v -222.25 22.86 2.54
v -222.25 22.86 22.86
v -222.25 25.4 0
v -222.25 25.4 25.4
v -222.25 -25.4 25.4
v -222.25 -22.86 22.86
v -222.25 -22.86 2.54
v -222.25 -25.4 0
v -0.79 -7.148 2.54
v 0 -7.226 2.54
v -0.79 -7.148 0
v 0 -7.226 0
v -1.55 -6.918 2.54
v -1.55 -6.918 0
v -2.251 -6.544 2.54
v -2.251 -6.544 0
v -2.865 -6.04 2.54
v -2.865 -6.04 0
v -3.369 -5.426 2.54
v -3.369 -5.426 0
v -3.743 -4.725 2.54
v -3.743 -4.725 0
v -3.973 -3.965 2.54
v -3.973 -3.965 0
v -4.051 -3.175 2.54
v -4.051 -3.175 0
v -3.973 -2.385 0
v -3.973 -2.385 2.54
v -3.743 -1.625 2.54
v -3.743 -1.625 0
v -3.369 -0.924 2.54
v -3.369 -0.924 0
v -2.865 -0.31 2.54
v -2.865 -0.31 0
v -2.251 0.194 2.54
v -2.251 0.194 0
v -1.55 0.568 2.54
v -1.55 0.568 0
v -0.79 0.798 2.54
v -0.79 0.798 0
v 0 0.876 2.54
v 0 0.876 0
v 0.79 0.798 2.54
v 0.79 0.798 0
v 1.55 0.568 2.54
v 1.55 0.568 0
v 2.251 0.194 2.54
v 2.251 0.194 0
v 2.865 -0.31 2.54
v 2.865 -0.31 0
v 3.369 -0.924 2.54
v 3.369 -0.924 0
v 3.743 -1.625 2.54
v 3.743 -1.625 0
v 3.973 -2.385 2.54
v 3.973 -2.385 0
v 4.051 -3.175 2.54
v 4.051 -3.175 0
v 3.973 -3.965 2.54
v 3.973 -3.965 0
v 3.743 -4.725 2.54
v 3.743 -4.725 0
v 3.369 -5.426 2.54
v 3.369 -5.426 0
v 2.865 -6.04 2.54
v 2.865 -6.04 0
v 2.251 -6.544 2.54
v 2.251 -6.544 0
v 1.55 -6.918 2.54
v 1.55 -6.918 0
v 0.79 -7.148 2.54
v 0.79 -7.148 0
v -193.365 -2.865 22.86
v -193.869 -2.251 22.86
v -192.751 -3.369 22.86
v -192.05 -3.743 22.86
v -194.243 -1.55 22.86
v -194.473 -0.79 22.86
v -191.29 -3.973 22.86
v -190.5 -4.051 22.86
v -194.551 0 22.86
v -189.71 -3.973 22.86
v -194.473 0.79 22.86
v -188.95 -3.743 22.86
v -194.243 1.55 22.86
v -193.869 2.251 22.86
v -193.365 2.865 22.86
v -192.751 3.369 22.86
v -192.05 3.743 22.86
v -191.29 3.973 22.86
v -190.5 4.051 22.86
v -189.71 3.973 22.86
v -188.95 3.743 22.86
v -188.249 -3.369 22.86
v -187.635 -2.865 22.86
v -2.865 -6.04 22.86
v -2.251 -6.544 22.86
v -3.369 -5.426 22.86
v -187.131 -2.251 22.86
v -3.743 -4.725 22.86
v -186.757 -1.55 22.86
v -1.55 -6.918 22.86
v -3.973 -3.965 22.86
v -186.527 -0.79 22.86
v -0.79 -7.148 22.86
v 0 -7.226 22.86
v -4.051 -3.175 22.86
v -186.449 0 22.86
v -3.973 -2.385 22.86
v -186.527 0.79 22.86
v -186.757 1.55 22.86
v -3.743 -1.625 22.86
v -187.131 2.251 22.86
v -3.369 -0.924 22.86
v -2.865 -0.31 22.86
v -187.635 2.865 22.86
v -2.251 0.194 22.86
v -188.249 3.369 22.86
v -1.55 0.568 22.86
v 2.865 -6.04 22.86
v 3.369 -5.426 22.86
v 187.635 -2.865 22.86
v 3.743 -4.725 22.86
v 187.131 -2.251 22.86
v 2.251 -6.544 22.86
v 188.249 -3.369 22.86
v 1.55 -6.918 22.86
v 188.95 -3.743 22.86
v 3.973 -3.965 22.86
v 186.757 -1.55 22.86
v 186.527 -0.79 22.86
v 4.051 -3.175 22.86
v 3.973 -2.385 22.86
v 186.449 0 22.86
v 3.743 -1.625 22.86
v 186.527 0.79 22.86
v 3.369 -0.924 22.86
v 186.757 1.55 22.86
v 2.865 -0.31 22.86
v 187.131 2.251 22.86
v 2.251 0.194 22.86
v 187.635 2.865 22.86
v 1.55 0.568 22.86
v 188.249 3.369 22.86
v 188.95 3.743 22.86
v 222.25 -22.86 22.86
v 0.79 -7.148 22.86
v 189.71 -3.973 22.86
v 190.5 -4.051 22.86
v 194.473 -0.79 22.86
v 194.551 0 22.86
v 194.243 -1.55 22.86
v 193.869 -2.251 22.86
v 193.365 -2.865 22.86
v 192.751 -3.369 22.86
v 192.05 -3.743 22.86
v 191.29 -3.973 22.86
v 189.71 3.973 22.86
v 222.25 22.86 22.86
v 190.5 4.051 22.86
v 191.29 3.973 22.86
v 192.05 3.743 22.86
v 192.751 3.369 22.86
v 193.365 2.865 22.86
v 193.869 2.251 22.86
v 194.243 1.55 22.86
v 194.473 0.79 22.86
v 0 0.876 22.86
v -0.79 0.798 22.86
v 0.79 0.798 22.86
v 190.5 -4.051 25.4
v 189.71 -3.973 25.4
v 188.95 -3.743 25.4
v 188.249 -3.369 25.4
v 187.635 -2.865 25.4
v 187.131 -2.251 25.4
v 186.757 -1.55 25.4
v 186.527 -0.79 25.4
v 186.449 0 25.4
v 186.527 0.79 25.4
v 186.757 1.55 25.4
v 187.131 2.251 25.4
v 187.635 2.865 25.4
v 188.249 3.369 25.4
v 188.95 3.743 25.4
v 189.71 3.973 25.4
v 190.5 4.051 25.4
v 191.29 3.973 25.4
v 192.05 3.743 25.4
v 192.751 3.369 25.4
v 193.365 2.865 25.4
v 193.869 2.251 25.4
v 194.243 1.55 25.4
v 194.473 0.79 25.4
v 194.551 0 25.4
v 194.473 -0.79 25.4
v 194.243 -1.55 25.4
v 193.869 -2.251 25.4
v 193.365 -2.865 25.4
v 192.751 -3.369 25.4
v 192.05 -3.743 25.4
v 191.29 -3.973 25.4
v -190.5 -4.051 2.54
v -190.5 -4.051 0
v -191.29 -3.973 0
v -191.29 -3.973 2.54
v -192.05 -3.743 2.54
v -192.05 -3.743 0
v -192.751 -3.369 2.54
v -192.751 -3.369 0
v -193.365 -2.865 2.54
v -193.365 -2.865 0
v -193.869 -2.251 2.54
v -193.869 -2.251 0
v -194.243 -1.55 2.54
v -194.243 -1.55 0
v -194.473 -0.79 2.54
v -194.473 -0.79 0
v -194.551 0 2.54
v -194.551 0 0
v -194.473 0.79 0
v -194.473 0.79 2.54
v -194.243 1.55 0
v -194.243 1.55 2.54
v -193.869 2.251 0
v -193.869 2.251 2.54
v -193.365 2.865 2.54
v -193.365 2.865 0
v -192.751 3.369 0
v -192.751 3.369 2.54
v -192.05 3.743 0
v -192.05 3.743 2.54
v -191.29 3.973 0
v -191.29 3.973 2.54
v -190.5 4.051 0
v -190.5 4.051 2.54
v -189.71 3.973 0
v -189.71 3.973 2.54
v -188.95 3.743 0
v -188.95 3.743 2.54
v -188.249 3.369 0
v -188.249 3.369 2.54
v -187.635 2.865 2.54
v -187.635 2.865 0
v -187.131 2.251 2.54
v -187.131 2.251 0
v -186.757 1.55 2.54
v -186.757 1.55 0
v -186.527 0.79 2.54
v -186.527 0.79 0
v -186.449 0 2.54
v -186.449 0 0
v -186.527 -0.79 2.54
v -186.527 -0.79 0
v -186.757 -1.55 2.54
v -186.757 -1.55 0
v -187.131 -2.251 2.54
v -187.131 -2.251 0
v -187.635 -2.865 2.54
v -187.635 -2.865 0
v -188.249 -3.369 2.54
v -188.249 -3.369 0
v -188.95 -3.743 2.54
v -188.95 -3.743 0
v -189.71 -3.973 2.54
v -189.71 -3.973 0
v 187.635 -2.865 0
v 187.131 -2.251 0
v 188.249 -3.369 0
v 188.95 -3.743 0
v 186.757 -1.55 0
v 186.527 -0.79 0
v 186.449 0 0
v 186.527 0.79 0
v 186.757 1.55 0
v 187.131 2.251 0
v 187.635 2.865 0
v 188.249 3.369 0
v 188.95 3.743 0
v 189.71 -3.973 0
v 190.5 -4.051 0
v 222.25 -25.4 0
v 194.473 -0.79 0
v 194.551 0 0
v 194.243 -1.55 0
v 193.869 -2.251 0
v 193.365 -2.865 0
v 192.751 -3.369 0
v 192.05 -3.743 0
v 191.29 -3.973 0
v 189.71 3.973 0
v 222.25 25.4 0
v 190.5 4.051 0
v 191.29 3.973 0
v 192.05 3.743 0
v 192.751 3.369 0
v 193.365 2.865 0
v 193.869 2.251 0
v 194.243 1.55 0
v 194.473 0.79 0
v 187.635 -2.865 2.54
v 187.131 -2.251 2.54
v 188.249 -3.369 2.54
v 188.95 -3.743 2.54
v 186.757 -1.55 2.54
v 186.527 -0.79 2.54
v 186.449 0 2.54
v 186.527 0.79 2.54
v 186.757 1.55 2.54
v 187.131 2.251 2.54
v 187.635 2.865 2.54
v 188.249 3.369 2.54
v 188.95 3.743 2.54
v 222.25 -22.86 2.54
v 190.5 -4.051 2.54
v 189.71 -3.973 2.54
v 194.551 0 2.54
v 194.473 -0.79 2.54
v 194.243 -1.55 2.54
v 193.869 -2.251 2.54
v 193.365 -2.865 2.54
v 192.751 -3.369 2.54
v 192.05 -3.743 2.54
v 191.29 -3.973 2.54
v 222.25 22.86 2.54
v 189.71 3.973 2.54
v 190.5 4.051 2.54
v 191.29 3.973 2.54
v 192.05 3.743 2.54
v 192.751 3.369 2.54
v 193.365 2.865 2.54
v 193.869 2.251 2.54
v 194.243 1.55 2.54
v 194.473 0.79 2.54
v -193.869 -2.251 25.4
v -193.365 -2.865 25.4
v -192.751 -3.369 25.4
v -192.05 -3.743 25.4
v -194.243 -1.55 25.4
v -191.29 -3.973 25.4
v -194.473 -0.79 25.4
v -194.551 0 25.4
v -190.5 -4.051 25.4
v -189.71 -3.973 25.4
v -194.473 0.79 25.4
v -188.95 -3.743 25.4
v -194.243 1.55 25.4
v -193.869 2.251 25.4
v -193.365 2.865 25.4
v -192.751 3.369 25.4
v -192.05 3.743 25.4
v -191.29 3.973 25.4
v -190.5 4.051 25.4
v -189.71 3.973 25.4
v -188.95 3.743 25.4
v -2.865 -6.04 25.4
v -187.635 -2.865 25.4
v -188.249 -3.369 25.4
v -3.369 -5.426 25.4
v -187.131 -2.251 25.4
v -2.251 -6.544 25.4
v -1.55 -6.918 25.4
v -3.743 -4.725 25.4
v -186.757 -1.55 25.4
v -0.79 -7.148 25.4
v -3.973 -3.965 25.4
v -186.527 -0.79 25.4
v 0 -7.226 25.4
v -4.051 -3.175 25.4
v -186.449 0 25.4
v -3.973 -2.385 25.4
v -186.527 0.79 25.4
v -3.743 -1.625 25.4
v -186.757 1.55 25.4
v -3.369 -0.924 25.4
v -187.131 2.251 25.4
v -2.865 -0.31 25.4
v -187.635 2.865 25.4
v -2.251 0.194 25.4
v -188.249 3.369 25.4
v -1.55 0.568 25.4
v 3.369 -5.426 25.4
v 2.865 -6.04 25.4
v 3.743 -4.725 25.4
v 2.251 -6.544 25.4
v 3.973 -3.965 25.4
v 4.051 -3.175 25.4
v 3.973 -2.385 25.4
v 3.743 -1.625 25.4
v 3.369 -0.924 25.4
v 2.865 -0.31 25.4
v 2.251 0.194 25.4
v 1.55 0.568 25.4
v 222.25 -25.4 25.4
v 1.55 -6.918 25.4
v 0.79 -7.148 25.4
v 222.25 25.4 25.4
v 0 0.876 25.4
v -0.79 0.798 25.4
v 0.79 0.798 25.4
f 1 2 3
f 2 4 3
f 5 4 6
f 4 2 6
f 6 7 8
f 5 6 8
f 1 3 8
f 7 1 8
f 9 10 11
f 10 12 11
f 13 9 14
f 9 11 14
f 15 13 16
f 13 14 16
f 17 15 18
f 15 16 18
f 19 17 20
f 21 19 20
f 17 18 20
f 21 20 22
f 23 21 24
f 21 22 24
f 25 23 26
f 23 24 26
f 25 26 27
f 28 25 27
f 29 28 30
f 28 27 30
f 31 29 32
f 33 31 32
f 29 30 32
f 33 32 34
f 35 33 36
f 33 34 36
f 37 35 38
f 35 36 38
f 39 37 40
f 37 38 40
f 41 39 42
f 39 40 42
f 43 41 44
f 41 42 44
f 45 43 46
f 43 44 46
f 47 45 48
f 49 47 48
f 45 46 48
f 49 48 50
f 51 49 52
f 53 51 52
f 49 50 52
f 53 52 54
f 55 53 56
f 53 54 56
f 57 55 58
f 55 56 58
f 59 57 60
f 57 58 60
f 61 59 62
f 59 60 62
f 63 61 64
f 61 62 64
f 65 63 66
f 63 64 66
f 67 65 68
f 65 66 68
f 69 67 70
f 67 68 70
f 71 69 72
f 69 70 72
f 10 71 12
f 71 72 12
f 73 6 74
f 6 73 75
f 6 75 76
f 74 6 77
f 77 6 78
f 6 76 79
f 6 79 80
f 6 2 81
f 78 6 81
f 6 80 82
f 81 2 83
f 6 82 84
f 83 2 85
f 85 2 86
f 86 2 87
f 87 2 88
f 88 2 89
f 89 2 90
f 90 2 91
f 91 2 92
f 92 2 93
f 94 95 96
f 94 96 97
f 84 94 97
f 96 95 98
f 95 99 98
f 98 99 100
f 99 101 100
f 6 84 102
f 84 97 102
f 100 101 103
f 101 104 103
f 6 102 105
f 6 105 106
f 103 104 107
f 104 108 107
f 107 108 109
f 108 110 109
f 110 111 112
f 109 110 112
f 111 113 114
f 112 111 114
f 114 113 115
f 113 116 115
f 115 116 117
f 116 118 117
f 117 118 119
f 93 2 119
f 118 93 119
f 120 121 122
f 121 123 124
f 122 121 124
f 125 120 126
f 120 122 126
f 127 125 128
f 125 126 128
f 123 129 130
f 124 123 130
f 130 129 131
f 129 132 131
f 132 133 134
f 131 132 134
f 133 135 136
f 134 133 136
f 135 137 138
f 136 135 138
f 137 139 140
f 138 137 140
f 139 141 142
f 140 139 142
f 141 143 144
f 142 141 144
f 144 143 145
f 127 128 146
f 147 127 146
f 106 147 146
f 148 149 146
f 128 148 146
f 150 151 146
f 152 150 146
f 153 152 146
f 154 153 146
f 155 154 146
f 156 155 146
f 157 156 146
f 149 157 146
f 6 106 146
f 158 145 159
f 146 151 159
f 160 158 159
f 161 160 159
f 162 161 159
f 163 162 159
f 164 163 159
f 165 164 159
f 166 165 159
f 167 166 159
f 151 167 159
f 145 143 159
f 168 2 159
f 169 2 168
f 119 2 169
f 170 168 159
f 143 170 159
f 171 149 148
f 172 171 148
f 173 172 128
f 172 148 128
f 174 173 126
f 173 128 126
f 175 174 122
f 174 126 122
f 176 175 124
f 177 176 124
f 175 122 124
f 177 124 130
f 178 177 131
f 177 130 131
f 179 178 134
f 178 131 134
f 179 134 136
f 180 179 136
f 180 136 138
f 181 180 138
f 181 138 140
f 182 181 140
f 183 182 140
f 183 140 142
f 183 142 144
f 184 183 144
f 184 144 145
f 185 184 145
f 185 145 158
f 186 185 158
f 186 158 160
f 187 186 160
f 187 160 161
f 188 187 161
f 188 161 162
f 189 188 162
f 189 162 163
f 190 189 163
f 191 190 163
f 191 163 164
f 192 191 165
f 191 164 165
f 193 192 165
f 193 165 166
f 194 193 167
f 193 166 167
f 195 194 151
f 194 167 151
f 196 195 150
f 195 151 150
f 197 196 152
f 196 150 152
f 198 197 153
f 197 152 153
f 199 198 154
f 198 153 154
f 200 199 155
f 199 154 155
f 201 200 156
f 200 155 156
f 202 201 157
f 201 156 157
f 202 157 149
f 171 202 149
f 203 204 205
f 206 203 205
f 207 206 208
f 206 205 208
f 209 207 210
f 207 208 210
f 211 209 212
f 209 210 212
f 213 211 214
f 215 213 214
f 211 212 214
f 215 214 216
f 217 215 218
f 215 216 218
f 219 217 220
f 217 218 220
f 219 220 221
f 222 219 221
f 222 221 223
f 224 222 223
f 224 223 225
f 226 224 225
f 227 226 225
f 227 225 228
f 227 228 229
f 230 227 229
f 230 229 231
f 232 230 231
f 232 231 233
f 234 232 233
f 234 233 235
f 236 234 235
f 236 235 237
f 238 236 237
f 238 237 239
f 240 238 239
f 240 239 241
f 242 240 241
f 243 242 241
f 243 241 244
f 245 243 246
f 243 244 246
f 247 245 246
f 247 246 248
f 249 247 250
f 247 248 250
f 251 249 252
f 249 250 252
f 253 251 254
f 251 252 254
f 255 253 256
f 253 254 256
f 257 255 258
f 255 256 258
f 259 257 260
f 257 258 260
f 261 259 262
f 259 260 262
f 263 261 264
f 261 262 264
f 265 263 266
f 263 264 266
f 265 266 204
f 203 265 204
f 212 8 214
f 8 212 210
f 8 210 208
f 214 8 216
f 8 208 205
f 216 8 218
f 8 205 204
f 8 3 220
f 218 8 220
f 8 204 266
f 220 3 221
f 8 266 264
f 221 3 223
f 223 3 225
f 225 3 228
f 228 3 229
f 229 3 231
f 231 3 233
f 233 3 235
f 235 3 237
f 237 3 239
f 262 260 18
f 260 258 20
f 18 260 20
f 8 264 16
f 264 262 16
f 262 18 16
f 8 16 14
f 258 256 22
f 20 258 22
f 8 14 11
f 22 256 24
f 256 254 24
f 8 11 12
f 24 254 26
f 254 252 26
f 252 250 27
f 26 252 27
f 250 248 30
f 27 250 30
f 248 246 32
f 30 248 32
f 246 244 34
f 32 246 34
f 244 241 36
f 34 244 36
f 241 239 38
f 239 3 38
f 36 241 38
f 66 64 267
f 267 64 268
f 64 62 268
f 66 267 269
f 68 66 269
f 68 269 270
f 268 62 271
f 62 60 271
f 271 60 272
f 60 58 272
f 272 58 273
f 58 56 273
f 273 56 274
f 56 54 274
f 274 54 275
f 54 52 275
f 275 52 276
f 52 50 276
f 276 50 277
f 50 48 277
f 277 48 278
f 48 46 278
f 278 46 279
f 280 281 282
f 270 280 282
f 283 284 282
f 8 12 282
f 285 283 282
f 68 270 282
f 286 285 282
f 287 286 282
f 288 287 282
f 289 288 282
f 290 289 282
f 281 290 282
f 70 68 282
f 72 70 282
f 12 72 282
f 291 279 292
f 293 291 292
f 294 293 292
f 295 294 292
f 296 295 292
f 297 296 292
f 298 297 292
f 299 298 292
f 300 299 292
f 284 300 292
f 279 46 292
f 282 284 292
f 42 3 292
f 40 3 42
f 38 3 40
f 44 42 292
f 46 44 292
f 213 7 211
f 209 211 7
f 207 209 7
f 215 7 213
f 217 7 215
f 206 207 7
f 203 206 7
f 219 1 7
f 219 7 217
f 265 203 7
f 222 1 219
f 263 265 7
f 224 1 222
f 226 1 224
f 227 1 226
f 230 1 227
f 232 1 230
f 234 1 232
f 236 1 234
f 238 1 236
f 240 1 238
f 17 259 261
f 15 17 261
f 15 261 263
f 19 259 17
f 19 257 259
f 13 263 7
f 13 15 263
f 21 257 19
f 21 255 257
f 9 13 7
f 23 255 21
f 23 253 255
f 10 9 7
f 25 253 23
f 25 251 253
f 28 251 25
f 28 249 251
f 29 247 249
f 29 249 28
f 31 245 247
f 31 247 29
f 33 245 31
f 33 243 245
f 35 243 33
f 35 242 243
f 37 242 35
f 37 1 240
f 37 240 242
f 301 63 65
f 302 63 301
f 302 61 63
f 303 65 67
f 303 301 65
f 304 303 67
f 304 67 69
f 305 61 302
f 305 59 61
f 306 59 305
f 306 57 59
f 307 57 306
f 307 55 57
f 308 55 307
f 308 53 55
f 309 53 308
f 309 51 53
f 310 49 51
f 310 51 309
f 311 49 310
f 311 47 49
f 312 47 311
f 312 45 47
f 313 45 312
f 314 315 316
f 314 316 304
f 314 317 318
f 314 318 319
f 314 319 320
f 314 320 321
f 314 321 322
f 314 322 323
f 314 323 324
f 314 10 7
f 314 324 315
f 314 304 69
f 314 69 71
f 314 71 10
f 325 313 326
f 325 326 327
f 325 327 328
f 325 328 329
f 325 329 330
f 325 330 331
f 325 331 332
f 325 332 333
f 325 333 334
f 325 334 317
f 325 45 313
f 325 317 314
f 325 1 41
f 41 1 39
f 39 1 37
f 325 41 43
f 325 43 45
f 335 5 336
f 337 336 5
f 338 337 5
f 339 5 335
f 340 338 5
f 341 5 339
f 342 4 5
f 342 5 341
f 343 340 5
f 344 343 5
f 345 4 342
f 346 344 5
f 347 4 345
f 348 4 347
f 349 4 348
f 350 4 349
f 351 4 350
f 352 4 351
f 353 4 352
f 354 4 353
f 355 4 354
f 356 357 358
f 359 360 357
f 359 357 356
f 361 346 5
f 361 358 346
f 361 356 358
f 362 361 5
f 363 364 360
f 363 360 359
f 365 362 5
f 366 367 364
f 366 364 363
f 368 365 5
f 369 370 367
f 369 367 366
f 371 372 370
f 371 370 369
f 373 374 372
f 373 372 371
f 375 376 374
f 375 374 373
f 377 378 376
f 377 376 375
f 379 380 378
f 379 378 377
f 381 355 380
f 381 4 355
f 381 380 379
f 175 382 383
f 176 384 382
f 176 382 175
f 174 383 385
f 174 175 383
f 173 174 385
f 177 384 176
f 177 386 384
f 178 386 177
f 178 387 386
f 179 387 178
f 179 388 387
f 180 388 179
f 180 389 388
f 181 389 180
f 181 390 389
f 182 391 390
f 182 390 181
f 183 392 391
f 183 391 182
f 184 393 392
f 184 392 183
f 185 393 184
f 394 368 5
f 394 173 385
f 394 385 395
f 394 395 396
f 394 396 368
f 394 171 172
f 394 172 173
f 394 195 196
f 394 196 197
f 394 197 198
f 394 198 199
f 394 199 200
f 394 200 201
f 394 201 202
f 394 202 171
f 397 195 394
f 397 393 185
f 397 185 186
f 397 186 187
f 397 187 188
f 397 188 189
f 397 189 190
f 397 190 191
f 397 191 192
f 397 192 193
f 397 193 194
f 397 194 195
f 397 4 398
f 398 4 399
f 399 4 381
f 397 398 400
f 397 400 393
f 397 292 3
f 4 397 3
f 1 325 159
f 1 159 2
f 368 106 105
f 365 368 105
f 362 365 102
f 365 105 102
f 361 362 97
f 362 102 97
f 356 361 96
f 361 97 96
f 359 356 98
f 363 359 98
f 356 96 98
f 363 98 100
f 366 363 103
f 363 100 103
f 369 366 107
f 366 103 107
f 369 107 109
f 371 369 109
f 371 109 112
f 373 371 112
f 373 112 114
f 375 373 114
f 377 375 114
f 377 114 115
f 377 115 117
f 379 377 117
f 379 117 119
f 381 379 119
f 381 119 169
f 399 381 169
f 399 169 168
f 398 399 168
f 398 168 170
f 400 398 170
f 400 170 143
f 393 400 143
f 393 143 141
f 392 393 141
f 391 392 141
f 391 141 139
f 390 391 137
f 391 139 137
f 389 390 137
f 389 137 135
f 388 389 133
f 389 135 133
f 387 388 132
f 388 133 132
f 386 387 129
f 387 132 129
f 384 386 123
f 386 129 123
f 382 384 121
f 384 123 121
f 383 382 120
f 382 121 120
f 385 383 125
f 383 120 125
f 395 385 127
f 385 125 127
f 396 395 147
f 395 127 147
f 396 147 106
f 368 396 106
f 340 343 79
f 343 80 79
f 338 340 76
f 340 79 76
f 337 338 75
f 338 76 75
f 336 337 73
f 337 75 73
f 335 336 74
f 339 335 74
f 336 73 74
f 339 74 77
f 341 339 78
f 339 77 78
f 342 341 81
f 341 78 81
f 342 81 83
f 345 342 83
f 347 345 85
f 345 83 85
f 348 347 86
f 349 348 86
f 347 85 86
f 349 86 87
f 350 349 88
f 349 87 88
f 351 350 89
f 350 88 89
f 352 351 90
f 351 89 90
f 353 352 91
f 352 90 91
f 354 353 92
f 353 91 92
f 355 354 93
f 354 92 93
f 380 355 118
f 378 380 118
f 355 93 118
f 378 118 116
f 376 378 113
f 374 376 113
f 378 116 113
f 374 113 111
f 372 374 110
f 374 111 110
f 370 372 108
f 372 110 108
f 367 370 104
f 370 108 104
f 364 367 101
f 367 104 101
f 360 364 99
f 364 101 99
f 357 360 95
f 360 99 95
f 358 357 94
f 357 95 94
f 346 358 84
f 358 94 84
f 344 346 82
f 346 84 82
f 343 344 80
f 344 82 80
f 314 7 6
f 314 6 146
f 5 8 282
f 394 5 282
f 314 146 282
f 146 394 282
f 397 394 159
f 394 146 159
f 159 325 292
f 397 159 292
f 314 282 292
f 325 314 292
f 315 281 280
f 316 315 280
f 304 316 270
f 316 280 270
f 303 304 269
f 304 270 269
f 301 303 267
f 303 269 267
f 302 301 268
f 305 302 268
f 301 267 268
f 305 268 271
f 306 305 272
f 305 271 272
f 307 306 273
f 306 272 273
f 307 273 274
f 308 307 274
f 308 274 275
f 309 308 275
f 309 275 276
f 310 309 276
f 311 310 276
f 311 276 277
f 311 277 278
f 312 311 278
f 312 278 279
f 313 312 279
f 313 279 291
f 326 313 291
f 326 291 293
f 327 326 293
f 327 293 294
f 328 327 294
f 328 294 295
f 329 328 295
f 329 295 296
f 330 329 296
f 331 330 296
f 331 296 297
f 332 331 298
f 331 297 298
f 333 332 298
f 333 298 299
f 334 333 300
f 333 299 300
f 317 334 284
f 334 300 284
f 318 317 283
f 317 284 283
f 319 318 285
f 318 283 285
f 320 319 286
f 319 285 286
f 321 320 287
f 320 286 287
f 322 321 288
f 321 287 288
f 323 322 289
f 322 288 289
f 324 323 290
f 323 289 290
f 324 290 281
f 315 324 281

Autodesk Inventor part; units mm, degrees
ref_plane "YZ Plane" through (0, 0, 0) normal (1, 0, 0) x (0, 1, 0)
ref_plane "XZ Plane" through (0, 0, 0) normal (0, 1, 0) x (-1, 0, 0)
ref_plane "XY Plane" through (0, 0, 0) normal (0, 0, 1) x (1, 0, 0)
sketch "Sketch1" plane through (0, 0, 0) normal (0, 0, 1) x (1, 0, 0)
  line L0 (222.25, 25.4) -> (-222.25, 25.4)
  line L1 (-222.25, 25.4) -> (-222.25, -25.4)
  line L2 (-222.25, -25.4) -> (222.25, -25.4)
  line L3 (222.25, -25.4) -> (222.25, 25.4)
  line L4 (222.25, 25.4) -> (-222.25, -25.4) construction
  line L5 (-222.25, 25.4) -> (222.25, -25.4) construction
  point P0 (0, 0)
  dimension "d0" = 444.5
  dimension "d1" = 50.8
extrude "Extrusion1" add sketch "Sketch1" along normal blind 25.4
sketch "Sketch2" plane through (0, 0, 25.4) normal (0, 0, 1) x (1, 0, 0)
  point P0 (0, -3.175)
  point P1 (0, -3.175)
  point P2 (-190.5, 0)
  point P3 (190.5, 0)
  point P4 (0, 0)
  dimension "d4" = 3.175
  dimension "d5" = 190.5
  dimension "d6" = 190.5
  dimension "d7" = 3.175
shell "Shell1" thickness 2.54 removed faces 2 at (222.25, -8.4667, 8.4667) at (-222.25, 8.4667, 16.9333)
hole "Hole1" at (0, -3.175, 25.4) at (-190.5, 0, 25.4) at (190.5, 0, 25.4) direction (0, 0, -1) diameter 8.1026 end through all
equation "\"d6\" = d5"
properties part number "Drive base"
